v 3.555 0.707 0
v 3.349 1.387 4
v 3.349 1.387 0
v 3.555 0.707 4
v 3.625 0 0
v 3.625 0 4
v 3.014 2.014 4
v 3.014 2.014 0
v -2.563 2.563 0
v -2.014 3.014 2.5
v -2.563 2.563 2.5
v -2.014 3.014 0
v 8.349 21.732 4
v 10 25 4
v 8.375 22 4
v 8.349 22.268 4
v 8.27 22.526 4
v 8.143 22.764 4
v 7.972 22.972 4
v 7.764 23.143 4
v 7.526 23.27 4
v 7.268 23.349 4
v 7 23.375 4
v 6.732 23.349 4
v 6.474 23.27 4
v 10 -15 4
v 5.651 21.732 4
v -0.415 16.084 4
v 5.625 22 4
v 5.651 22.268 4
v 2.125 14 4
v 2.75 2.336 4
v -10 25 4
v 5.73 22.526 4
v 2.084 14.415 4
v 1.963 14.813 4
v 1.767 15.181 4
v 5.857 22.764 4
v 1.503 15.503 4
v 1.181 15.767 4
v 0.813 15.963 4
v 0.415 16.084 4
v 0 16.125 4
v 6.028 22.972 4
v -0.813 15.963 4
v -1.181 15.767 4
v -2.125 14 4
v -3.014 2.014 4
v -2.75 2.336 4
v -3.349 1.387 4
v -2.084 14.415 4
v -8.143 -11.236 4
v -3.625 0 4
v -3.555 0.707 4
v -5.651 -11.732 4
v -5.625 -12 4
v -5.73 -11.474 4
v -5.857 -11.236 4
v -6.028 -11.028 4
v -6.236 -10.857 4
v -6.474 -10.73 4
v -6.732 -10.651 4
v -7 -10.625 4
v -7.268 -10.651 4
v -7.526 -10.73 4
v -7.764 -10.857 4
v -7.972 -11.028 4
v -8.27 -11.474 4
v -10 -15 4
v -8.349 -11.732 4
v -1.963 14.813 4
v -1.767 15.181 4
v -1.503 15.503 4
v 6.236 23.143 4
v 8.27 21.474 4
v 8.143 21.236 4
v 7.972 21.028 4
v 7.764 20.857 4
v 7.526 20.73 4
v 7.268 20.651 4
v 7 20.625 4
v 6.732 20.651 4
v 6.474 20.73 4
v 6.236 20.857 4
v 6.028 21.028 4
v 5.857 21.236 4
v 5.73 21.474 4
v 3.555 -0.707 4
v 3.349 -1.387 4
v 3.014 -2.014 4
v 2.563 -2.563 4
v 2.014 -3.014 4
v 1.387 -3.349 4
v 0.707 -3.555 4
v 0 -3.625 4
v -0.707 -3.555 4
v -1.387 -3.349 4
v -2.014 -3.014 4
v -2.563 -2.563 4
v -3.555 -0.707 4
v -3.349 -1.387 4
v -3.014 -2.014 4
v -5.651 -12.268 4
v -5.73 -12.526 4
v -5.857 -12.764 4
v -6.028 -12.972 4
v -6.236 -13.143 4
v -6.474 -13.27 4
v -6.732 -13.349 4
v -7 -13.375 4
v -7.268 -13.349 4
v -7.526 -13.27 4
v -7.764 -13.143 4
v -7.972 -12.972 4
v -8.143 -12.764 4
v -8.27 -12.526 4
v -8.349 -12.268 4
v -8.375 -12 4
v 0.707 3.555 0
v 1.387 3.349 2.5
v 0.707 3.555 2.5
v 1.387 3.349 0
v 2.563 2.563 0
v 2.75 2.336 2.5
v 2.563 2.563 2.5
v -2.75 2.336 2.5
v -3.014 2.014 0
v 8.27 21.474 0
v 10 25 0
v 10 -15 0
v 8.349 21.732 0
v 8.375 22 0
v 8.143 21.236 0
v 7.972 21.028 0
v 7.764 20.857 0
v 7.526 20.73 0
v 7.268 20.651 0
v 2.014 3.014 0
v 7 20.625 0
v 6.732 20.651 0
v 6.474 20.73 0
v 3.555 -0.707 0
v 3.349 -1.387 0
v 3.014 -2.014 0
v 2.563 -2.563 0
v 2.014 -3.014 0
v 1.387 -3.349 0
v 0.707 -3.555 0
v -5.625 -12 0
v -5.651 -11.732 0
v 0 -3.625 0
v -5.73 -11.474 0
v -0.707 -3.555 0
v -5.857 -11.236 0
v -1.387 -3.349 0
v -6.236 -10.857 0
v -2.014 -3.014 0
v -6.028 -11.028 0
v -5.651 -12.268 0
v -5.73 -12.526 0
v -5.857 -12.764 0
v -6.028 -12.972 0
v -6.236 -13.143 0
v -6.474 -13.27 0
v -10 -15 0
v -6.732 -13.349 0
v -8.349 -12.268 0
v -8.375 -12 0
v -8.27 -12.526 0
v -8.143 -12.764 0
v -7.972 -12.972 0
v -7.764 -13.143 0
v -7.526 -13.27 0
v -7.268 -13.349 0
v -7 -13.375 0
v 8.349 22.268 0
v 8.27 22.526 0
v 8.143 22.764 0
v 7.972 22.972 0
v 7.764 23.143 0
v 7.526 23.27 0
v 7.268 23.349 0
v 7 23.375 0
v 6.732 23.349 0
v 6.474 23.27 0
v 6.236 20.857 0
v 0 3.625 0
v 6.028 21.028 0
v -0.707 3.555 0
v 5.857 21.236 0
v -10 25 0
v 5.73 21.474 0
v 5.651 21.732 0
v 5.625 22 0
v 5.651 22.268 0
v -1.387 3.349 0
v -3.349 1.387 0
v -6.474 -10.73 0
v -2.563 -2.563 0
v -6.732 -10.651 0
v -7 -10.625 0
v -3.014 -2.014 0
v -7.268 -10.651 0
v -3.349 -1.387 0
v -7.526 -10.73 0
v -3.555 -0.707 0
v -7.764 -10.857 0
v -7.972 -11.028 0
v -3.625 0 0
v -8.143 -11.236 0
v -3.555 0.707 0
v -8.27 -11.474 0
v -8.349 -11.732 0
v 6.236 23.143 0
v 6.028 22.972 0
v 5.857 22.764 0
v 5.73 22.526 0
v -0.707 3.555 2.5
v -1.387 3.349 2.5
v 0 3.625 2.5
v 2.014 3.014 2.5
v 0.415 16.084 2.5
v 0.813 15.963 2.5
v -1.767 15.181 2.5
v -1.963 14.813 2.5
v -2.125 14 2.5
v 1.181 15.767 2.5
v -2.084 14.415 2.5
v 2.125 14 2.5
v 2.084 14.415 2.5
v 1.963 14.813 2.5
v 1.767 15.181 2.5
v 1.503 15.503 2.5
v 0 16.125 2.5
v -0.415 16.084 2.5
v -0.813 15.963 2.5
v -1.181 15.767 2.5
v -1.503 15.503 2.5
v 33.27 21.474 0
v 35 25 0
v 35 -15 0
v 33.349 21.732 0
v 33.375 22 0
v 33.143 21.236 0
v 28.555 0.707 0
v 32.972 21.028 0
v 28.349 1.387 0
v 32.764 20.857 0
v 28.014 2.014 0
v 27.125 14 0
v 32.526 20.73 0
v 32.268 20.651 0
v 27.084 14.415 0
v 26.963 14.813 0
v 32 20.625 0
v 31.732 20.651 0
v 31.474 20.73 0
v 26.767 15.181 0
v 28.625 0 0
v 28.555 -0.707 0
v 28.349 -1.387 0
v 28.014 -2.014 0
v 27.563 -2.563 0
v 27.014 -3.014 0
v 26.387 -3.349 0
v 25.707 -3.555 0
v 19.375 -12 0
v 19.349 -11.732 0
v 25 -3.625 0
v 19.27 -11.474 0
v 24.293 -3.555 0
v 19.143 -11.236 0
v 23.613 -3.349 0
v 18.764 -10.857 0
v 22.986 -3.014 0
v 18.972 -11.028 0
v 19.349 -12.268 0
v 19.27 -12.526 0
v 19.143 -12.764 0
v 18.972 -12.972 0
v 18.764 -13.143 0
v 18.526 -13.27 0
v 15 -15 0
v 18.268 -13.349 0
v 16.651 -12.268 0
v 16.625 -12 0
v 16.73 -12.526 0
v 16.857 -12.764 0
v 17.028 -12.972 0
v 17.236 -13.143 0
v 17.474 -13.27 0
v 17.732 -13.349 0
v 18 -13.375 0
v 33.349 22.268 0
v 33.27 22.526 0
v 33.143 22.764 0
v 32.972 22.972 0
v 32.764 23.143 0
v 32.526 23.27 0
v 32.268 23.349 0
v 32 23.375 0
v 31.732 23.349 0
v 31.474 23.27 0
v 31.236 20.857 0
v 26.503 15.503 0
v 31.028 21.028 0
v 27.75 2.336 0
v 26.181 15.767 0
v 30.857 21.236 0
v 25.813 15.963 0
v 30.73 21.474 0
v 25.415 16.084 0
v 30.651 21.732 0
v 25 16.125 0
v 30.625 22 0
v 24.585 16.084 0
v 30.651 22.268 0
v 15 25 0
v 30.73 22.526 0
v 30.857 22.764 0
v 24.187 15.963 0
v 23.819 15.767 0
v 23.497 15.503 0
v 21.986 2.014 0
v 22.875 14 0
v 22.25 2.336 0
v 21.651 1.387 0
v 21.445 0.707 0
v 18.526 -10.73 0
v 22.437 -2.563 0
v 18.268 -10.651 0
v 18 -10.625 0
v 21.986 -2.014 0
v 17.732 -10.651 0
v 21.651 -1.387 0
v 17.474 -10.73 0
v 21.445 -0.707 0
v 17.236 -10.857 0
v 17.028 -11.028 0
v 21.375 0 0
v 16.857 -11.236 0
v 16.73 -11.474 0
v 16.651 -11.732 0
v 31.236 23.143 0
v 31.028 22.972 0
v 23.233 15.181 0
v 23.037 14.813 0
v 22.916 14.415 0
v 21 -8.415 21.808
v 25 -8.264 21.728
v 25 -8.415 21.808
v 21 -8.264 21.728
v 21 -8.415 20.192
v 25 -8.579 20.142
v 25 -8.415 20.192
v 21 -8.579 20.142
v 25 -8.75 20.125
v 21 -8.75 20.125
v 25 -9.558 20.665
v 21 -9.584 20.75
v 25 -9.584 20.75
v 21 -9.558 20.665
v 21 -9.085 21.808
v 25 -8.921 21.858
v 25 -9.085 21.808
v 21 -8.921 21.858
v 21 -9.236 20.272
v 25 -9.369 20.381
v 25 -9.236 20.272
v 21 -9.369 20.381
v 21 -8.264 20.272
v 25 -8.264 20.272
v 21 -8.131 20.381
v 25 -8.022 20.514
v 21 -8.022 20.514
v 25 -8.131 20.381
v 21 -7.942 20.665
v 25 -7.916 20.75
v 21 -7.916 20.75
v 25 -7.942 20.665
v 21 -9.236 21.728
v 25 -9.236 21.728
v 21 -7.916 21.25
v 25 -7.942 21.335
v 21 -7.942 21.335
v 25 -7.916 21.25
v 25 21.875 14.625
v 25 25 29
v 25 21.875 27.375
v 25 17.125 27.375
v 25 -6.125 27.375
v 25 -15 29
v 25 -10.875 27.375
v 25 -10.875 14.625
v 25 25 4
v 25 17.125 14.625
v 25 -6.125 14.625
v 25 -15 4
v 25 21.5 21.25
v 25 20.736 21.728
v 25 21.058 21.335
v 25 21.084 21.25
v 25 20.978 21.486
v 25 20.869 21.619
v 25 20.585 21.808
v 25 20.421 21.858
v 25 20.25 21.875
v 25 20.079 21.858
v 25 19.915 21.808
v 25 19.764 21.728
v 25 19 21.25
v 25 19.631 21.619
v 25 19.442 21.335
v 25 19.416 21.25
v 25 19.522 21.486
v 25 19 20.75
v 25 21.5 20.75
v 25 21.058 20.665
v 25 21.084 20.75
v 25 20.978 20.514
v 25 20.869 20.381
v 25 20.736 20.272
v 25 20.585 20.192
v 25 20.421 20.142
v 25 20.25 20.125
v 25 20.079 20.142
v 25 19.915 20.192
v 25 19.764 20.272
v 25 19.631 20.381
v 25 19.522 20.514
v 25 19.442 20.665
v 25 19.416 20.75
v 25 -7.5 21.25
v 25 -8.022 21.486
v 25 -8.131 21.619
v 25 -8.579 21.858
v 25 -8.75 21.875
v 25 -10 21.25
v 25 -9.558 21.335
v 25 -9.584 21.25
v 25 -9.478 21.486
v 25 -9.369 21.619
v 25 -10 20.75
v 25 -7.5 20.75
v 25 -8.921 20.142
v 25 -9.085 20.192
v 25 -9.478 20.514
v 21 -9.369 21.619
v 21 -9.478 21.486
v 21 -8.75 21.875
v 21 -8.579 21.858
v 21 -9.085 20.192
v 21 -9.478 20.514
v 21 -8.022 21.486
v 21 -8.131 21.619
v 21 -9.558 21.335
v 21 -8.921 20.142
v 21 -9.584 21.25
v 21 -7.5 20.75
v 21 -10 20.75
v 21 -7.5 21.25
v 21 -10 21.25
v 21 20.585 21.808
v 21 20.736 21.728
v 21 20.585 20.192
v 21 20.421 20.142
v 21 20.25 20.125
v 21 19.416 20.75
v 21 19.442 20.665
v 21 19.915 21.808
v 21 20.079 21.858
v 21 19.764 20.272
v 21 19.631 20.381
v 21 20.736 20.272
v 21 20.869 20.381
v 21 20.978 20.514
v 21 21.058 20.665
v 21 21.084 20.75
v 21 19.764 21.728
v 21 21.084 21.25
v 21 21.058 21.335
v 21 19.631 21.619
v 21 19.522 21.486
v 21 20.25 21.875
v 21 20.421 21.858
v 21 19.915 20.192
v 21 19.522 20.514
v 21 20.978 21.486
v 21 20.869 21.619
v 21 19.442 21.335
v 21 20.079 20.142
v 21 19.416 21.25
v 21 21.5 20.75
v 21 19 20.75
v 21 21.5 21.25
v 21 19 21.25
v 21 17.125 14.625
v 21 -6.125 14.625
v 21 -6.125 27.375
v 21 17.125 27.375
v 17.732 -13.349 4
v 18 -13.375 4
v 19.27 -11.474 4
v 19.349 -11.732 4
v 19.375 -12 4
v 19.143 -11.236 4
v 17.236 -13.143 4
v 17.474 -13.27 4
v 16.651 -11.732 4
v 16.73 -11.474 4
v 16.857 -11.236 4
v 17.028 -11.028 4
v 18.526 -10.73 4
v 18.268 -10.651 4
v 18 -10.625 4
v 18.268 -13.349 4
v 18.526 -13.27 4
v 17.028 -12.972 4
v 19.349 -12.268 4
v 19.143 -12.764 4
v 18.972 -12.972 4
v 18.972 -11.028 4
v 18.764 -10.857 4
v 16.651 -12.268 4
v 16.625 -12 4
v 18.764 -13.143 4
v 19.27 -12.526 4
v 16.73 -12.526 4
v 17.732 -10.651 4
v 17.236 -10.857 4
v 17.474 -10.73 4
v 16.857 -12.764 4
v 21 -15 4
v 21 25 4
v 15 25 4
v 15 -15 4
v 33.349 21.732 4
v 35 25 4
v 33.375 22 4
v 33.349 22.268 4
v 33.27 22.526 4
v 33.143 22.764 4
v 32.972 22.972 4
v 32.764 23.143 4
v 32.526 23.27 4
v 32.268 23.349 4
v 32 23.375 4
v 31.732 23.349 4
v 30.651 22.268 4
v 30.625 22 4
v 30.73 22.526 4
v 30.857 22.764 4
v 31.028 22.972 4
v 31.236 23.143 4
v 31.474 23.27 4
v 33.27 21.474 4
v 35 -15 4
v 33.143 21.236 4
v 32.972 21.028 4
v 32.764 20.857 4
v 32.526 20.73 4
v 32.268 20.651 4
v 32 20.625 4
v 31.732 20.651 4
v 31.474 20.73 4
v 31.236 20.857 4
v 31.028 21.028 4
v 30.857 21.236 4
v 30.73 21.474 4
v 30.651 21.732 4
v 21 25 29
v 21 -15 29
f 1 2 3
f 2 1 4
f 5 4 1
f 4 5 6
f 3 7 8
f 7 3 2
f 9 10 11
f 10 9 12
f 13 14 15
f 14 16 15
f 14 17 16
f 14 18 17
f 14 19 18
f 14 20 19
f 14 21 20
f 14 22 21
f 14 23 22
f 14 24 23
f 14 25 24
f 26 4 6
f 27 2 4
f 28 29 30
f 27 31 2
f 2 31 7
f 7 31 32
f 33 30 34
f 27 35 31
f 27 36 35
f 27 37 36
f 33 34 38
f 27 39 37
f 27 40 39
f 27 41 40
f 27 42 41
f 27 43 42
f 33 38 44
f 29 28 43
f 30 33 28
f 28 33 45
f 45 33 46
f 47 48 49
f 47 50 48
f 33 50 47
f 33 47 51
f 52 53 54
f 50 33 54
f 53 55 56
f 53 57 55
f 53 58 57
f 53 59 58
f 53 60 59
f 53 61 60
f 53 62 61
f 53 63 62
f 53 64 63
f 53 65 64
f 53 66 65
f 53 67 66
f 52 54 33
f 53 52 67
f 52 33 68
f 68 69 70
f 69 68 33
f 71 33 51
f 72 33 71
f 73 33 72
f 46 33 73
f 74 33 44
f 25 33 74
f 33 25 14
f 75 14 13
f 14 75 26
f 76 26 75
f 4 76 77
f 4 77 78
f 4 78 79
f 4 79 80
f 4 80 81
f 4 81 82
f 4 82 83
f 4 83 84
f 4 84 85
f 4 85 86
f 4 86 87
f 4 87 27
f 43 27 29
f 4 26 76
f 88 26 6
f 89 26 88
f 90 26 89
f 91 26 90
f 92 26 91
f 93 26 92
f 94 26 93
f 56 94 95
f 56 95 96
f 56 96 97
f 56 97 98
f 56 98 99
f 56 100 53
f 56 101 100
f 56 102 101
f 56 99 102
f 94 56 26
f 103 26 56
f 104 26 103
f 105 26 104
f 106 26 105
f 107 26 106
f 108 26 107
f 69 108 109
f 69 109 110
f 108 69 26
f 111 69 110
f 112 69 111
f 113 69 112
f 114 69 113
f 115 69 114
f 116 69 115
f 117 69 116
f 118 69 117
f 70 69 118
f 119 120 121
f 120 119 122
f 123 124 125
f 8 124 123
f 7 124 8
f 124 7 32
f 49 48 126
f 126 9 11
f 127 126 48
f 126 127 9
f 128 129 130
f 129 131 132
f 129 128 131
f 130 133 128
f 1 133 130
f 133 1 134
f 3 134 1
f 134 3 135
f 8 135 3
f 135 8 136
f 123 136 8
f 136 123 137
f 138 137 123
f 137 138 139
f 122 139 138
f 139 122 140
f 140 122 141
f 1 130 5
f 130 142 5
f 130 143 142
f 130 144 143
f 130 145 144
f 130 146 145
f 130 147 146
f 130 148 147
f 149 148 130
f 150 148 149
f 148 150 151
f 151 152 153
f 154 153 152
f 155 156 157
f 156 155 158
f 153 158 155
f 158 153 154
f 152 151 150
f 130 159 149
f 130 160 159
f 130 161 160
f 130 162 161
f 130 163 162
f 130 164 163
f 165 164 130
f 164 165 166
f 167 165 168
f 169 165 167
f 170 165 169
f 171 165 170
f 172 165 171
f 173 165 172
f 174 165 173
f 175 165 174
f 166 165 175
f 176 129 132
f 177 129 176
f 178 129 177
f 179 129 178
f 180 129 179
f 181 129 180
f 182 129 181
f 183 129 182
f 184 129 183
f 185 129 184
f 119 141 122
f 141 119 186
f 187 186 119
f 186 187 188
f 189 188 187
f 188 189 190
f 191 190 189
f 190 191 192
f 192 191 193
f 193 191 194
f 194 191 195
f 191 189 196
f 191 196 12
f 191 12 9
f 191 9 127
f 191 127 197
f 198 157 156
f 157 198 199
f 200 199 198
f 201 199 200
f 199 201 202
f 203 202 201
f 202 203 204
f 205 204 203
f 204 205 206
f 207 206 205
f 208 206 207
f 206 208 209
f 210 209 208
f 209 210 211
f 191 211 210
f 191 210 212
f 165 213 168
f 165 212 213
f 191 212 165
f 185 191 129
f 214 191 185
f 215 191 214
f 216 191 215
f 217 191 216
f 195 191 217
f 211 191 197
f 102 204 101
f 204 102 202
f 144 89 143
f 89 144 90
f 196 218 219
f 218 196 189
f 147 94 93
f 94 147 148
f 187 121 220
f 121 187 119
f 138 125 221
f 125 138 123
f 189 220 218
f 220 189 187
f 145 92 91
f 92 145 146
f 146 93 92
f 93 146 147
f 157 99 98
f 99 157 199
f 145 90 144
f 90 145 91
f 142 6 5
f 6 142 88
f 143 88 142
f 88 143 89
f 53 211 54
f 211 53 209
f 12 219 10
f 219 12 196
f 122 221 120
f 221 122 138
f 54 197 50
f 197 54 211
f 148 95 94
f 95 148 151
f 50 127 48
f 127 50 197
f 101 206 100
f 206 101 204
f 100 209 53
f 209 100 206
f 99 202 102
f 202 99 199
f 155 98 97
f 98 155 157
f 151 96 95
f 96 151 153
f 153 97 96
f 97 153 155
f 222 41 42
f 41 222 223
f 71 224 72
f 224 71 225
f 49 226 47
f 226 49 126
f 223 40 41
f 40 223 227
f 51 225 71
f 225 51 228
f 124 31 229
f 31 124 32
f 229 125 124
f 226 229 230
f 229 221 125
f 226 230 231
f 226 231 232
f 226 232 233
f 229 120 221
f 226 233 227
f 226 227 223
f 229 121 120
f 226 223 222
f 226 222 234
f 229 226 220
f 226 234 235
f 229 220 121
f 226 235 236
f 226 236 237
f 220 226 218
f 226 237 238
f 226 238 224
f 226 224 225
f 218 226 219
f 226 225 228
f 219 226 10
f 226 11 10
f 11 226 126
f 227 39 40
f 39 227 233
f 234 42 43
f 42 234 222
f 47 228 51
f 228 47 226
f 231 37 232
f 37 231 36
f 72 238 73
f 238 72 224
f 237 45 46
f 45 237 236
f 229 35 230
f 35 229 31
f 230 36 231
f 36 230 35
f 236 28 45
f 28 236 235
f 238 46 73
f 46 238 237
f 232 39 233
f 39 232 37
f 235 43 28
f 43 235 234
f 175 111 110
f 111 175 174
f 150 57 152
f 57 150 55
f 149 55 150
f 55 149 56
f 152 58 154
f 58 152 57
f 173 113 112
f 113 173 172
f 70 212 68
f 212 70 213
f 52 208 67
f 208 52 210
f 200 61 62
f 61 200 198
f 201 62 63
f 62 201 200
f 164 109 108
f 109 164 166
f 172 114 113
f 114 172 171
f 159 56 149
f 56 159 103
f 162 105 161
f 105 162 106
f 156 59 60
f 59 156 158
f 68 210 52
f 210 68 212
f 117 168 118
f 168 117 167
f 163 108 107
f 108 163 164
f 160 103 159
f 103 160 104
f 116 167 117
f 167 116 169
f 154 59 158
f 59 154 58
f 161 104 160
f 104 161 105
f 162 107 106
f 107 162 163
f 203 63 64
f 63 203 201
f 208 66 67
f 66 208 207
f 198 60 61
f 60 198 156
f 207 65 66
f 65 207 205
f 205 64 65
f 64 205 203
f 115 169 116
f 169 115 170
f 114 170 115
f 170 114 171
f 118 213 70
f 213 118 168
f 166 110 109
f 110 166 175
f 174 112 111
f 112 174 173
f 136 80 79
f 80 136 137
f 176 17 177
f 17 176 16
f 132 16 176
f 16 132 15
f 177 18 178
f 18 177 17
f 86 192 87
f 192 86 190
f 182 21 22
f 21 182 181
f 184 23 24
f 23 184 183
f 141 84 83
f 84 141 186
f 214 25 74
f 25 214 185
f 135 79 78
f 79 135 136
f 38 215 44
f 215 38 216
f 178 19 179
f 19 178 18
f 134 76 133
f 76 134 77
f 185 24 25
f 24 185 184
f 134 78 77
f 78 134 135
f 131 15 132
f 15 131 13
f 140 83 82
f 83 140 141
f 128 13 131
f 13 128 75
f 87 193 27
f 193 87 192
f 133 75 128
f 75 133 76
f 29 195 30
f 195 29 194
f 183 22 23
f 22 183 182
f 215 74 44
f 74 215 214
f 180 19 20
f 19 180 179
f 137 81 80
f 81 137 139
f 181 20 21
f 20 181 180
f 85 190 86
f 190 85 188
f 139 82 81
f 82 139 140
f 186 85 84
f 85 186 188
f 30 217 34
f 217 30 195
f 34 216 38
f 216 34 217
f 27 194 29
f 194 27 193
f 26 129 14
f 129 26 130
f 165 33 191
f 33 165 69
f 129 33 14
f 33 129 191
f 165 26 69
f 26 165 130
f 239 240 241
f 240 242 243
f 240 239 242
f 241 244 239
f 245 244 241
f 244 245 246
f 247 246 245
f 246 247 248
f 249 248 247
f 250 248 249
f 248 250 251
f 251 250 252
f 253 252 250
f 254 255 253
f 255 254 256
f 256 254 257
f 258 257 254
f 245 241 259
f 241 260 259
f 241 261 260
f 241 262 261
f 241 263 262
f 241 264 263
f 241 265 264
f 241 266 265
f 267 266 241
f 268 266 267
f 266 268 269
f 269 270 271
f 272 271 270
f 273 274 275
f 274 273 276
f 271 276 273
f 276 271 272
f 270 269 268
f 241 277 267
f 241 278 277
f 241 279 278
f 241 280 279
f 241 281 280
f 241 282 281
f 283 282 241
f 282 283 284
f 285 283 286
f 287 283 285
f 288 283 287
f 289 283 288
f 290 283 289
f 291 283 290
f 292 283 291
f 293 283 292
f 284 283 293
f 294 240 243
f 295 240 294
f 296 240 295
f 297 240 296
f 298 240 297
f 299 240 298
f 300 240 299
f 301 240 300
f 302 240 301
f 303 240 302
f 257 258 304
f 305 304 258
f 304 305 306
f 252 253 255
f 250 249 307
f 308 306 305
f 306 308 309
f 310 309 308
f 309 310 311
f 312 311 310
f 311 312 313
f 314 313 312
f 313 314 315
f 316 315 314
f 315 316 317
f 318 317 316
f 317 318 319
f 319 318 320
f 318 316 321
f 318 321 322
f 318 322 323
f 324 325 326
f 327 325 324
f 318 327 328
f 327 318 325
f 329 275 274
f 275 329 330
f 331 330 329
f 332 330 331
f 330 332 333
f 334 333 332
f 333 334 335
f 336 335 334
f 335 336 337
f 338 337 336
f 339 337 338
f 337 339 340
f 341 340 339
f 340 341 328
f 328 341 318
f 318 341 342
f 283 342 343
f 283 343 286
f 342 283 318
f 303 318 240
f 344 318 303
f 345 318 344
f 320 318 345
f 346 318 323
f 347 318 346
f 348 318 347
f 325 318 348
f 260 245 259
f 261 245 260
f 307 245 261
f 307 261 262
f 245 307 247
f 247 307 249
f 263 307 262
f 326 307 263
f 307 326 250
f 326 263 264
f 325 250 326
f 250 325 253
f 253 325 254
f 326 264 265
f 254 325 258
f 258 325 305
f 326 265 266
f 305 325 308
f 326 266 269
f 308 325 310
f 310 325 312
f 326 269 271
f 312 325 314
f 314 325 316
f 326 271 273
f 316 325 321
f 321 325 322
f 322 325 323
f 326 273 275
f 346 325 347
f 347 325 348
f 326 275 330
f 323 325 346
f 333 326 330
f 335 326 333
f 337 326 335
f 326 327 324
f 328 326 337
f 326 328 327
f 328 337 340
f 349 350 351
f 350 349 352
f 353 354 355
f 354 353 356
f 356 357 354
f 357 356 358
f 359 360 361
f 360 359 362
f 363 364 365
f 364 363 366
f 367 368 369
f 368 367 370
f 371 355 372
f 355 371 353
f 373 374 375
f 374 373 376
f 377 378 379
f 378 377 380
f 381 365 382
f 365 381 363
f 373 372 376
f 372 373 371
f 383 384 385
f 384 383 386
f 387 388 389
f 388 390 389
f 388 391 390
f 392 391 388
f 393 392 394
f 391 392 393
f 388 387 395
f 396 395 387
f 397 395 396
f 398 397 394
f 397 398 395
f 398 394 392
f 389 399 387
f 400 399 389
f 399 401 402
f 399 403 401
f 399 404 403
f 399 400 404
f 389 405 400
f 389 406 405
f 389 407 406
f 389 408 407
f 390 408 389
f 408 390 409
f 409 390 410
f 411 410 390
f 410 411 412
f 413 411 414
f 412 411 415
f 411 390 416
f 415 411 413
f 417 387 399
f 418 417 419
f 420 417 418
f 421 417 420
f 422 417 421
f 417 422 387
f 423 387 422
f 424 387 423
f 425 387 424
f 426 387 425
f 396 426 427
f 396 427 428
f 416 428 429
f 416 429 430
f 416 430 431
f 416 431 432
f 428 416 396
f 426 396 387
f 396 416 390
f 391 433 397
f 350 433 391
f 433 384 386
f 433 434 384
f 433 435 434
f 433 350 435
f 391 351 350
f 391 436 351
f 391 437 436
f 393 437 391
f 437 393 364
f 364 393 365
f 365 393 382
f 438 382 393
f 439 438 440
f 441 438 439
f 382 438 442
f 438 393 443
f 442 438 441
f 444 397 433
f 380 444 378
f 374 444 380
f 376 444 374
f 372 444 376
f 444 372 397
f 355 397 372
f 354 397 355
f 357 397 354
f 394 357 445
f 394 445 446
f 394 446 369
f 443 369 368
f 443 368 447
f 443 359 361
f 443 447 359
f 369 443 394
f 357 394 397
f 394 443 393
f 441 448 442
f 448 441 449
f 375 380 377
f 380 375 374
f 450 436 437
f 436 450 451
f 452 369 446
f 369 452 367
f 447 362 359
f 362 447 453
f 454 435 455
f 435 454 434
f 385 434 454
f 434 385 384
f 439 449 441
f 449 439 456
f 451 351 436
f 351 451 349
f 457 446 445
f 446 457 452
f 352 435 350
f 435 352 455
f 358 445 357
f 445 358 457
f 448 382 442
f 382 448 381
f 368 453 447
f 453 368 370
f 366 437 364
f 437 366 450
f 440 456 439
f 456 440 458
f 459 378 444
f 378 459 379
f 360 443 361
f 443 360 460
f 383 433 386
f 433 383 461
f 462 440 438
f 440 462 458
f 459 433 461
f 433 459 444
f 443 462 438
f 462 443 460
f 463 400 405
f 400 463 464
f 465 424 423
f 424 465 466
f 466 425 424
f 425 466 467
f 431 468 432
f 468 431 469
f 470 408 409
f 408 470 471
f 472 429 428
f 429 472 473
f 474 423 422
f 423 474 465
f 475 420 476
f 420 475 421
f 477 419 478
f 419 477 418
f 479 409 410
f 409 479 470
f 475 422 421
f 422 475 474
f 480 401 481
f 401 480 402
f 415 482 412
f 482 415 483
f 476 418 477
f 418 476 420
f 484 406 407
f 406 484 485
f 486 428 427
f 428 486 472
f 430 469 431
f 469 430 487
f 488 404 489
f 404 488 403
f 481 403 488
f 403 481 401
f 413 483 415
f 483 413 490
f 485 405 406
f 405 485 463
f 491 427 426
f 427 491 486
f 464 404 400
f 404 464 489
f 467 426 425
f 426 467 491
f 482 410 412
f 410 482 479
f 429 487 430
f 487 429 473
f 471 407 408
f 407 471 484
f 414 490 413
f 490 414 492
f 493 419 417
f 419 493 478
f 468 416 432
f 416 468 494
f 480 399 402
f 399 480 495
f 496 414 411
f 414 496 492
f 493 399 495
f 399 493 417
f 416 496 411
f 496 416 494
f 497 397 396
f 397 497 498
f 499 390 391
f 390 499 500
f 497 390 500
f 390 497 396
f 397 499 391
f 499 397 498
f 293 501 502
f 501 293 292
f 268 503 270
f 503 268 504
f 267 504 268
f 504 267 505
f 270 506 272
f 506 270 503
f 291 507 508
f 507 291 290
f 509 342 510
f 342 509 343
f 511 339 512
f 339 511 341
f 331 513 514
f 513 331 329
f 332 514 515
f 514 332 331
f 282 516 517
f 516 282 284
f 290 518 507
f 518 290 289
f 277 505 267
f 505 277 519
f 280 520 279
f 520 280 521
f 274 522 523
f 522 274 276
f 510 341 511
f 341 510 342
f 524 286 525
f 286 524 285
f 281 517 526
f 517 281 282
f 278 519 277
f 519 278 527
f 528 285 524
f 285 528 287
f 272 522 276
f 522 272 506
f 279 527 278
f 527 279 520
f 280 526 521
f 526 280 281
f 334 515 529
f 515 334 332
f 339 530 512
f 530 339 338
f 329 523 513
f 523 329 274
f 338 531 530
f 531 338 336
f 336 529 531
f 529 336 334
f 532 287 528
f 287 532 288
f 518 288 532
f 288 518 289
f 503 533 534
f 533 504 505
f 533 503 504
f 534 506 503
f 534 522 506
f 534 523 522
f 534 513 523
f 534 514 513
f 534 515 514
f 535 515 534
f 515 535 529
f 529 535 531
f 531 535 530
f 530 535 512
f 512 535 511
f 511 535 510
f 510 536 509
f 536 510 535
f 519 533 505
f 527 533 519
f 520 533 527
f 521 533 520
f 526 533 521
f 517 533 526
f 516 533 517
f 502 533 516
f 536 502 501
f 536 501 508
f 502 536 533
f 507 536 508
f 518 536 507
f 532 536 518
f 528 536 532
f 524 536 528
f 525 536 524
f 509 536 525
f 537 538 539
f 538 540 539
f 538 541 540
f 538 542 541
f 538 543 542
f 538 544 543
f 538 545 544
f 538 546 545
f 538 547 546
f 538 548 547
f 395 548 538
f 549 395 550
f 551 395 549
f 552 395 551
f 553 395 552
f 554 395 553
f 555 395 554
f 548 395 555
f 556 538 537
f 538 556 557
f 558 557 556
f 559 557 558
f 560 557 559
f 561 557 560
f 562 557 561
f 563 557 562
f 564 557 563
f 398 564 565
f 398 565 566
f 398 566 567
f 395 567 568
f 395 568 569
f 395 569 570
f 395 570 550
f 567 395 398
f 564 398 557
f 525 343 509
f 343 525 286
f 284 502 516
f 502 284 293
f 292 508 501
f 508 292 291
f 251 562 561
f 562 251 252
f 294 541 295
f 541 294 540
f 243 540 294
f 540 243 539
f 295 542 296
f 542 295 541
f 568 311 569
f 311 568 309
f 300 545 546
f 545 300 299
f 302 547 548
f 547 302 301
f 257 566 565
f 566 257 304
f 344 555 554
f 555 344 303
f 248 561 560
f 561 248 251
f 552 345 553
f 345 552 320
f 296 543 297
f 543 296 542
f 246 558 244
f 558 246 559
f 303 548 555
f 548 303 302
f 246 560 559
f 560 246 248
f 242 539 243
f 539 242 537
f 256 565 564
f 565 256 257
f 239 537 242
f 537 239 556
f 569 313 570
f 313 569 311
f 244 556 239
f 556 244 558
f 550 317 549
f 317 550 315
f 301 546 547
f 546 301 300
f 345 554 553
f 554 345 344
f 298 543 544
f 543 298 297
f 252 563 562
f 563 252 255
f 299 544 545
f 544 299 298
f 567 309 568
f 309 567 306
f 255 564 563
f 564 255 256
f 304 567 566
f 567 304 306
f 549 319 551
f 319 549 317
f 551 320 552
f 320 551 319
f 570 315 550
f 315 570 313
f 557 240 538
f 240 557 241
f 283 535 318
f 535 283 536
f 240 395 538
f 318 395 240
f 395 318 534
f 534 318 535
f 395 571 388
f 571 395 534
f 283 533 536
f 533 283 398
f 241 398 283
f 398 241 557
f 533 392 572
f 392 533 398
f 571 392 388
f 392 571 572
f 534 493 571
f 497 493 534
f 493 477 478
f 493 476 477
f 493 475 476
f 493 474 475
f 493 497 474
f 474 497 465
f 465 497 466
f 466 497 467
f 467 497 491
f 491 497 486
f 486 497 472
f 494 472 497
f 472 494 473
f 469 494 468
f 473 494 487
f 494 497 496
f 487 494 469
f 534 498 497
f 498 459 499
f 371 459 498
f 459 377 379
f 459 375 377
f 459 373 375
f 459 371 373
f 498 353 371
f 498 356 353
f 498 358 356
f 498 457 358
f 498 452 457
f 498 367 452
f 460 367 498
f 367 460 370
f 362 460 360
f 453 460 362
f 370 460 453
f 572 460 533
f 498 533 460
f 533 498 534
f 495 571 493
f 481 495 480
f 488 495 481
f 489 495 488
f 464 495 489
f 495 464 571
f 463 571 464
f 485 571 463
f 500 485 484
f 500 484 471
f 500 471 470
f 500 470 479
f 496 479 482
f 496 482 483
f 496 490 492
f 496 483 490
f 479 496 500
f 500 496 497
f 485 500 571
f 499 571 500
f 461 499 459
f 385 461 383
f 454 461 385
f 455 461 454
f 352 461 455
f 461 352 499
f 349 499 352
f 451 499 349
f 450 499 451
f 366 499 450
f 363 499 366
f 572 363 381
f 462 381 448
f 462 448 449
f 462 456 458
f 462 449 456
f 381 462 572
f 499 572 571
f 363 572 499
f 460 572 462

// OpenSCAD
// file: SG-90.scad
$fn = 32;

// the motor will be this much wider horizontally, so that holes made by difference with it will have tolerance.
// this will also be added to the radius of the horns circles.
toleranceGap = 0.25; 

module sg90()
{
    union()
    {
         // Body
        translate([0, 5.5, -6.5])
        cube([12.5 + toleranceGap, 23 + toleranceGap, 24], true);
        // Collar
        translate([0, 5.5, 2.5/2])
        cube([12.5 + toleranceGap, 32.5 + toleranceGap, 2.5], true);
        // Raise
        translate([0, 0, 24-18.5])
        cylinder(h=4.5, d=11.5);
        
        // Screw holes

        translate([0, -11.5/2-3, -4.5])
        union()
        {
            cylinder(h=4.5, d=1.75);
            translate([0, 0, 2.25])
            cube([0.5, 2.5, 4.5], true);
        }
        translate([0, -11.5/2+26, -4.5])
        union()
        {
            cylinder(h=4.5, d=1.75);
            translate([0, 0, 2.25])
            cube([0.5, 2.5, 4.5], true);
        }
    }
}

module horn()
{
    // Bottom part
    translate([0, 0, -2.5])
    cylinder(h=4, d=7+toleranceGap);
    // Horn part
    hull()
    {
        translate([0, 14, 0])
        cylinder(h=1.5, d=4+toleranceGap);
        cylinder(h=1.5, d=5.5+toleranceGap);
    }
}

difference()
{
    cube([15, 65, 4]);
    translate([15/2, 15, 4])
    #sg90();
    translate([15/2, 45, 2.5])
    #horn();
}
// main file
use <SG-90.scad>
$fn = 32;

module cutOuts()
{
    translate([0, 0, 2.5])
    horn();
    translate([0, 0, 25])
    rotate([0, 90, 0])
    sg90();
    
    //screws
    translate([-7, -12, 0])
    cylinder(h=8, d=2.75);
    translate([+7, 22, 0])
    cylinder(h=8, d=2.75);
}

//bottom plate
difference()
{
    union()
    {
        translate([-10, -15, 0])
        cube([20, 40, 4]);
    }
    cutOuts();
}

//top plate
translate([25, 0, -4]) //move to side for printing
difference()
{
    union()
    {
        translate([-10, -15, 4])
        cube([20, 40, 4]);
        translate([-4, -15, 8])
        cube([4, 40, 25]);
    }
    cutOuts();
}
